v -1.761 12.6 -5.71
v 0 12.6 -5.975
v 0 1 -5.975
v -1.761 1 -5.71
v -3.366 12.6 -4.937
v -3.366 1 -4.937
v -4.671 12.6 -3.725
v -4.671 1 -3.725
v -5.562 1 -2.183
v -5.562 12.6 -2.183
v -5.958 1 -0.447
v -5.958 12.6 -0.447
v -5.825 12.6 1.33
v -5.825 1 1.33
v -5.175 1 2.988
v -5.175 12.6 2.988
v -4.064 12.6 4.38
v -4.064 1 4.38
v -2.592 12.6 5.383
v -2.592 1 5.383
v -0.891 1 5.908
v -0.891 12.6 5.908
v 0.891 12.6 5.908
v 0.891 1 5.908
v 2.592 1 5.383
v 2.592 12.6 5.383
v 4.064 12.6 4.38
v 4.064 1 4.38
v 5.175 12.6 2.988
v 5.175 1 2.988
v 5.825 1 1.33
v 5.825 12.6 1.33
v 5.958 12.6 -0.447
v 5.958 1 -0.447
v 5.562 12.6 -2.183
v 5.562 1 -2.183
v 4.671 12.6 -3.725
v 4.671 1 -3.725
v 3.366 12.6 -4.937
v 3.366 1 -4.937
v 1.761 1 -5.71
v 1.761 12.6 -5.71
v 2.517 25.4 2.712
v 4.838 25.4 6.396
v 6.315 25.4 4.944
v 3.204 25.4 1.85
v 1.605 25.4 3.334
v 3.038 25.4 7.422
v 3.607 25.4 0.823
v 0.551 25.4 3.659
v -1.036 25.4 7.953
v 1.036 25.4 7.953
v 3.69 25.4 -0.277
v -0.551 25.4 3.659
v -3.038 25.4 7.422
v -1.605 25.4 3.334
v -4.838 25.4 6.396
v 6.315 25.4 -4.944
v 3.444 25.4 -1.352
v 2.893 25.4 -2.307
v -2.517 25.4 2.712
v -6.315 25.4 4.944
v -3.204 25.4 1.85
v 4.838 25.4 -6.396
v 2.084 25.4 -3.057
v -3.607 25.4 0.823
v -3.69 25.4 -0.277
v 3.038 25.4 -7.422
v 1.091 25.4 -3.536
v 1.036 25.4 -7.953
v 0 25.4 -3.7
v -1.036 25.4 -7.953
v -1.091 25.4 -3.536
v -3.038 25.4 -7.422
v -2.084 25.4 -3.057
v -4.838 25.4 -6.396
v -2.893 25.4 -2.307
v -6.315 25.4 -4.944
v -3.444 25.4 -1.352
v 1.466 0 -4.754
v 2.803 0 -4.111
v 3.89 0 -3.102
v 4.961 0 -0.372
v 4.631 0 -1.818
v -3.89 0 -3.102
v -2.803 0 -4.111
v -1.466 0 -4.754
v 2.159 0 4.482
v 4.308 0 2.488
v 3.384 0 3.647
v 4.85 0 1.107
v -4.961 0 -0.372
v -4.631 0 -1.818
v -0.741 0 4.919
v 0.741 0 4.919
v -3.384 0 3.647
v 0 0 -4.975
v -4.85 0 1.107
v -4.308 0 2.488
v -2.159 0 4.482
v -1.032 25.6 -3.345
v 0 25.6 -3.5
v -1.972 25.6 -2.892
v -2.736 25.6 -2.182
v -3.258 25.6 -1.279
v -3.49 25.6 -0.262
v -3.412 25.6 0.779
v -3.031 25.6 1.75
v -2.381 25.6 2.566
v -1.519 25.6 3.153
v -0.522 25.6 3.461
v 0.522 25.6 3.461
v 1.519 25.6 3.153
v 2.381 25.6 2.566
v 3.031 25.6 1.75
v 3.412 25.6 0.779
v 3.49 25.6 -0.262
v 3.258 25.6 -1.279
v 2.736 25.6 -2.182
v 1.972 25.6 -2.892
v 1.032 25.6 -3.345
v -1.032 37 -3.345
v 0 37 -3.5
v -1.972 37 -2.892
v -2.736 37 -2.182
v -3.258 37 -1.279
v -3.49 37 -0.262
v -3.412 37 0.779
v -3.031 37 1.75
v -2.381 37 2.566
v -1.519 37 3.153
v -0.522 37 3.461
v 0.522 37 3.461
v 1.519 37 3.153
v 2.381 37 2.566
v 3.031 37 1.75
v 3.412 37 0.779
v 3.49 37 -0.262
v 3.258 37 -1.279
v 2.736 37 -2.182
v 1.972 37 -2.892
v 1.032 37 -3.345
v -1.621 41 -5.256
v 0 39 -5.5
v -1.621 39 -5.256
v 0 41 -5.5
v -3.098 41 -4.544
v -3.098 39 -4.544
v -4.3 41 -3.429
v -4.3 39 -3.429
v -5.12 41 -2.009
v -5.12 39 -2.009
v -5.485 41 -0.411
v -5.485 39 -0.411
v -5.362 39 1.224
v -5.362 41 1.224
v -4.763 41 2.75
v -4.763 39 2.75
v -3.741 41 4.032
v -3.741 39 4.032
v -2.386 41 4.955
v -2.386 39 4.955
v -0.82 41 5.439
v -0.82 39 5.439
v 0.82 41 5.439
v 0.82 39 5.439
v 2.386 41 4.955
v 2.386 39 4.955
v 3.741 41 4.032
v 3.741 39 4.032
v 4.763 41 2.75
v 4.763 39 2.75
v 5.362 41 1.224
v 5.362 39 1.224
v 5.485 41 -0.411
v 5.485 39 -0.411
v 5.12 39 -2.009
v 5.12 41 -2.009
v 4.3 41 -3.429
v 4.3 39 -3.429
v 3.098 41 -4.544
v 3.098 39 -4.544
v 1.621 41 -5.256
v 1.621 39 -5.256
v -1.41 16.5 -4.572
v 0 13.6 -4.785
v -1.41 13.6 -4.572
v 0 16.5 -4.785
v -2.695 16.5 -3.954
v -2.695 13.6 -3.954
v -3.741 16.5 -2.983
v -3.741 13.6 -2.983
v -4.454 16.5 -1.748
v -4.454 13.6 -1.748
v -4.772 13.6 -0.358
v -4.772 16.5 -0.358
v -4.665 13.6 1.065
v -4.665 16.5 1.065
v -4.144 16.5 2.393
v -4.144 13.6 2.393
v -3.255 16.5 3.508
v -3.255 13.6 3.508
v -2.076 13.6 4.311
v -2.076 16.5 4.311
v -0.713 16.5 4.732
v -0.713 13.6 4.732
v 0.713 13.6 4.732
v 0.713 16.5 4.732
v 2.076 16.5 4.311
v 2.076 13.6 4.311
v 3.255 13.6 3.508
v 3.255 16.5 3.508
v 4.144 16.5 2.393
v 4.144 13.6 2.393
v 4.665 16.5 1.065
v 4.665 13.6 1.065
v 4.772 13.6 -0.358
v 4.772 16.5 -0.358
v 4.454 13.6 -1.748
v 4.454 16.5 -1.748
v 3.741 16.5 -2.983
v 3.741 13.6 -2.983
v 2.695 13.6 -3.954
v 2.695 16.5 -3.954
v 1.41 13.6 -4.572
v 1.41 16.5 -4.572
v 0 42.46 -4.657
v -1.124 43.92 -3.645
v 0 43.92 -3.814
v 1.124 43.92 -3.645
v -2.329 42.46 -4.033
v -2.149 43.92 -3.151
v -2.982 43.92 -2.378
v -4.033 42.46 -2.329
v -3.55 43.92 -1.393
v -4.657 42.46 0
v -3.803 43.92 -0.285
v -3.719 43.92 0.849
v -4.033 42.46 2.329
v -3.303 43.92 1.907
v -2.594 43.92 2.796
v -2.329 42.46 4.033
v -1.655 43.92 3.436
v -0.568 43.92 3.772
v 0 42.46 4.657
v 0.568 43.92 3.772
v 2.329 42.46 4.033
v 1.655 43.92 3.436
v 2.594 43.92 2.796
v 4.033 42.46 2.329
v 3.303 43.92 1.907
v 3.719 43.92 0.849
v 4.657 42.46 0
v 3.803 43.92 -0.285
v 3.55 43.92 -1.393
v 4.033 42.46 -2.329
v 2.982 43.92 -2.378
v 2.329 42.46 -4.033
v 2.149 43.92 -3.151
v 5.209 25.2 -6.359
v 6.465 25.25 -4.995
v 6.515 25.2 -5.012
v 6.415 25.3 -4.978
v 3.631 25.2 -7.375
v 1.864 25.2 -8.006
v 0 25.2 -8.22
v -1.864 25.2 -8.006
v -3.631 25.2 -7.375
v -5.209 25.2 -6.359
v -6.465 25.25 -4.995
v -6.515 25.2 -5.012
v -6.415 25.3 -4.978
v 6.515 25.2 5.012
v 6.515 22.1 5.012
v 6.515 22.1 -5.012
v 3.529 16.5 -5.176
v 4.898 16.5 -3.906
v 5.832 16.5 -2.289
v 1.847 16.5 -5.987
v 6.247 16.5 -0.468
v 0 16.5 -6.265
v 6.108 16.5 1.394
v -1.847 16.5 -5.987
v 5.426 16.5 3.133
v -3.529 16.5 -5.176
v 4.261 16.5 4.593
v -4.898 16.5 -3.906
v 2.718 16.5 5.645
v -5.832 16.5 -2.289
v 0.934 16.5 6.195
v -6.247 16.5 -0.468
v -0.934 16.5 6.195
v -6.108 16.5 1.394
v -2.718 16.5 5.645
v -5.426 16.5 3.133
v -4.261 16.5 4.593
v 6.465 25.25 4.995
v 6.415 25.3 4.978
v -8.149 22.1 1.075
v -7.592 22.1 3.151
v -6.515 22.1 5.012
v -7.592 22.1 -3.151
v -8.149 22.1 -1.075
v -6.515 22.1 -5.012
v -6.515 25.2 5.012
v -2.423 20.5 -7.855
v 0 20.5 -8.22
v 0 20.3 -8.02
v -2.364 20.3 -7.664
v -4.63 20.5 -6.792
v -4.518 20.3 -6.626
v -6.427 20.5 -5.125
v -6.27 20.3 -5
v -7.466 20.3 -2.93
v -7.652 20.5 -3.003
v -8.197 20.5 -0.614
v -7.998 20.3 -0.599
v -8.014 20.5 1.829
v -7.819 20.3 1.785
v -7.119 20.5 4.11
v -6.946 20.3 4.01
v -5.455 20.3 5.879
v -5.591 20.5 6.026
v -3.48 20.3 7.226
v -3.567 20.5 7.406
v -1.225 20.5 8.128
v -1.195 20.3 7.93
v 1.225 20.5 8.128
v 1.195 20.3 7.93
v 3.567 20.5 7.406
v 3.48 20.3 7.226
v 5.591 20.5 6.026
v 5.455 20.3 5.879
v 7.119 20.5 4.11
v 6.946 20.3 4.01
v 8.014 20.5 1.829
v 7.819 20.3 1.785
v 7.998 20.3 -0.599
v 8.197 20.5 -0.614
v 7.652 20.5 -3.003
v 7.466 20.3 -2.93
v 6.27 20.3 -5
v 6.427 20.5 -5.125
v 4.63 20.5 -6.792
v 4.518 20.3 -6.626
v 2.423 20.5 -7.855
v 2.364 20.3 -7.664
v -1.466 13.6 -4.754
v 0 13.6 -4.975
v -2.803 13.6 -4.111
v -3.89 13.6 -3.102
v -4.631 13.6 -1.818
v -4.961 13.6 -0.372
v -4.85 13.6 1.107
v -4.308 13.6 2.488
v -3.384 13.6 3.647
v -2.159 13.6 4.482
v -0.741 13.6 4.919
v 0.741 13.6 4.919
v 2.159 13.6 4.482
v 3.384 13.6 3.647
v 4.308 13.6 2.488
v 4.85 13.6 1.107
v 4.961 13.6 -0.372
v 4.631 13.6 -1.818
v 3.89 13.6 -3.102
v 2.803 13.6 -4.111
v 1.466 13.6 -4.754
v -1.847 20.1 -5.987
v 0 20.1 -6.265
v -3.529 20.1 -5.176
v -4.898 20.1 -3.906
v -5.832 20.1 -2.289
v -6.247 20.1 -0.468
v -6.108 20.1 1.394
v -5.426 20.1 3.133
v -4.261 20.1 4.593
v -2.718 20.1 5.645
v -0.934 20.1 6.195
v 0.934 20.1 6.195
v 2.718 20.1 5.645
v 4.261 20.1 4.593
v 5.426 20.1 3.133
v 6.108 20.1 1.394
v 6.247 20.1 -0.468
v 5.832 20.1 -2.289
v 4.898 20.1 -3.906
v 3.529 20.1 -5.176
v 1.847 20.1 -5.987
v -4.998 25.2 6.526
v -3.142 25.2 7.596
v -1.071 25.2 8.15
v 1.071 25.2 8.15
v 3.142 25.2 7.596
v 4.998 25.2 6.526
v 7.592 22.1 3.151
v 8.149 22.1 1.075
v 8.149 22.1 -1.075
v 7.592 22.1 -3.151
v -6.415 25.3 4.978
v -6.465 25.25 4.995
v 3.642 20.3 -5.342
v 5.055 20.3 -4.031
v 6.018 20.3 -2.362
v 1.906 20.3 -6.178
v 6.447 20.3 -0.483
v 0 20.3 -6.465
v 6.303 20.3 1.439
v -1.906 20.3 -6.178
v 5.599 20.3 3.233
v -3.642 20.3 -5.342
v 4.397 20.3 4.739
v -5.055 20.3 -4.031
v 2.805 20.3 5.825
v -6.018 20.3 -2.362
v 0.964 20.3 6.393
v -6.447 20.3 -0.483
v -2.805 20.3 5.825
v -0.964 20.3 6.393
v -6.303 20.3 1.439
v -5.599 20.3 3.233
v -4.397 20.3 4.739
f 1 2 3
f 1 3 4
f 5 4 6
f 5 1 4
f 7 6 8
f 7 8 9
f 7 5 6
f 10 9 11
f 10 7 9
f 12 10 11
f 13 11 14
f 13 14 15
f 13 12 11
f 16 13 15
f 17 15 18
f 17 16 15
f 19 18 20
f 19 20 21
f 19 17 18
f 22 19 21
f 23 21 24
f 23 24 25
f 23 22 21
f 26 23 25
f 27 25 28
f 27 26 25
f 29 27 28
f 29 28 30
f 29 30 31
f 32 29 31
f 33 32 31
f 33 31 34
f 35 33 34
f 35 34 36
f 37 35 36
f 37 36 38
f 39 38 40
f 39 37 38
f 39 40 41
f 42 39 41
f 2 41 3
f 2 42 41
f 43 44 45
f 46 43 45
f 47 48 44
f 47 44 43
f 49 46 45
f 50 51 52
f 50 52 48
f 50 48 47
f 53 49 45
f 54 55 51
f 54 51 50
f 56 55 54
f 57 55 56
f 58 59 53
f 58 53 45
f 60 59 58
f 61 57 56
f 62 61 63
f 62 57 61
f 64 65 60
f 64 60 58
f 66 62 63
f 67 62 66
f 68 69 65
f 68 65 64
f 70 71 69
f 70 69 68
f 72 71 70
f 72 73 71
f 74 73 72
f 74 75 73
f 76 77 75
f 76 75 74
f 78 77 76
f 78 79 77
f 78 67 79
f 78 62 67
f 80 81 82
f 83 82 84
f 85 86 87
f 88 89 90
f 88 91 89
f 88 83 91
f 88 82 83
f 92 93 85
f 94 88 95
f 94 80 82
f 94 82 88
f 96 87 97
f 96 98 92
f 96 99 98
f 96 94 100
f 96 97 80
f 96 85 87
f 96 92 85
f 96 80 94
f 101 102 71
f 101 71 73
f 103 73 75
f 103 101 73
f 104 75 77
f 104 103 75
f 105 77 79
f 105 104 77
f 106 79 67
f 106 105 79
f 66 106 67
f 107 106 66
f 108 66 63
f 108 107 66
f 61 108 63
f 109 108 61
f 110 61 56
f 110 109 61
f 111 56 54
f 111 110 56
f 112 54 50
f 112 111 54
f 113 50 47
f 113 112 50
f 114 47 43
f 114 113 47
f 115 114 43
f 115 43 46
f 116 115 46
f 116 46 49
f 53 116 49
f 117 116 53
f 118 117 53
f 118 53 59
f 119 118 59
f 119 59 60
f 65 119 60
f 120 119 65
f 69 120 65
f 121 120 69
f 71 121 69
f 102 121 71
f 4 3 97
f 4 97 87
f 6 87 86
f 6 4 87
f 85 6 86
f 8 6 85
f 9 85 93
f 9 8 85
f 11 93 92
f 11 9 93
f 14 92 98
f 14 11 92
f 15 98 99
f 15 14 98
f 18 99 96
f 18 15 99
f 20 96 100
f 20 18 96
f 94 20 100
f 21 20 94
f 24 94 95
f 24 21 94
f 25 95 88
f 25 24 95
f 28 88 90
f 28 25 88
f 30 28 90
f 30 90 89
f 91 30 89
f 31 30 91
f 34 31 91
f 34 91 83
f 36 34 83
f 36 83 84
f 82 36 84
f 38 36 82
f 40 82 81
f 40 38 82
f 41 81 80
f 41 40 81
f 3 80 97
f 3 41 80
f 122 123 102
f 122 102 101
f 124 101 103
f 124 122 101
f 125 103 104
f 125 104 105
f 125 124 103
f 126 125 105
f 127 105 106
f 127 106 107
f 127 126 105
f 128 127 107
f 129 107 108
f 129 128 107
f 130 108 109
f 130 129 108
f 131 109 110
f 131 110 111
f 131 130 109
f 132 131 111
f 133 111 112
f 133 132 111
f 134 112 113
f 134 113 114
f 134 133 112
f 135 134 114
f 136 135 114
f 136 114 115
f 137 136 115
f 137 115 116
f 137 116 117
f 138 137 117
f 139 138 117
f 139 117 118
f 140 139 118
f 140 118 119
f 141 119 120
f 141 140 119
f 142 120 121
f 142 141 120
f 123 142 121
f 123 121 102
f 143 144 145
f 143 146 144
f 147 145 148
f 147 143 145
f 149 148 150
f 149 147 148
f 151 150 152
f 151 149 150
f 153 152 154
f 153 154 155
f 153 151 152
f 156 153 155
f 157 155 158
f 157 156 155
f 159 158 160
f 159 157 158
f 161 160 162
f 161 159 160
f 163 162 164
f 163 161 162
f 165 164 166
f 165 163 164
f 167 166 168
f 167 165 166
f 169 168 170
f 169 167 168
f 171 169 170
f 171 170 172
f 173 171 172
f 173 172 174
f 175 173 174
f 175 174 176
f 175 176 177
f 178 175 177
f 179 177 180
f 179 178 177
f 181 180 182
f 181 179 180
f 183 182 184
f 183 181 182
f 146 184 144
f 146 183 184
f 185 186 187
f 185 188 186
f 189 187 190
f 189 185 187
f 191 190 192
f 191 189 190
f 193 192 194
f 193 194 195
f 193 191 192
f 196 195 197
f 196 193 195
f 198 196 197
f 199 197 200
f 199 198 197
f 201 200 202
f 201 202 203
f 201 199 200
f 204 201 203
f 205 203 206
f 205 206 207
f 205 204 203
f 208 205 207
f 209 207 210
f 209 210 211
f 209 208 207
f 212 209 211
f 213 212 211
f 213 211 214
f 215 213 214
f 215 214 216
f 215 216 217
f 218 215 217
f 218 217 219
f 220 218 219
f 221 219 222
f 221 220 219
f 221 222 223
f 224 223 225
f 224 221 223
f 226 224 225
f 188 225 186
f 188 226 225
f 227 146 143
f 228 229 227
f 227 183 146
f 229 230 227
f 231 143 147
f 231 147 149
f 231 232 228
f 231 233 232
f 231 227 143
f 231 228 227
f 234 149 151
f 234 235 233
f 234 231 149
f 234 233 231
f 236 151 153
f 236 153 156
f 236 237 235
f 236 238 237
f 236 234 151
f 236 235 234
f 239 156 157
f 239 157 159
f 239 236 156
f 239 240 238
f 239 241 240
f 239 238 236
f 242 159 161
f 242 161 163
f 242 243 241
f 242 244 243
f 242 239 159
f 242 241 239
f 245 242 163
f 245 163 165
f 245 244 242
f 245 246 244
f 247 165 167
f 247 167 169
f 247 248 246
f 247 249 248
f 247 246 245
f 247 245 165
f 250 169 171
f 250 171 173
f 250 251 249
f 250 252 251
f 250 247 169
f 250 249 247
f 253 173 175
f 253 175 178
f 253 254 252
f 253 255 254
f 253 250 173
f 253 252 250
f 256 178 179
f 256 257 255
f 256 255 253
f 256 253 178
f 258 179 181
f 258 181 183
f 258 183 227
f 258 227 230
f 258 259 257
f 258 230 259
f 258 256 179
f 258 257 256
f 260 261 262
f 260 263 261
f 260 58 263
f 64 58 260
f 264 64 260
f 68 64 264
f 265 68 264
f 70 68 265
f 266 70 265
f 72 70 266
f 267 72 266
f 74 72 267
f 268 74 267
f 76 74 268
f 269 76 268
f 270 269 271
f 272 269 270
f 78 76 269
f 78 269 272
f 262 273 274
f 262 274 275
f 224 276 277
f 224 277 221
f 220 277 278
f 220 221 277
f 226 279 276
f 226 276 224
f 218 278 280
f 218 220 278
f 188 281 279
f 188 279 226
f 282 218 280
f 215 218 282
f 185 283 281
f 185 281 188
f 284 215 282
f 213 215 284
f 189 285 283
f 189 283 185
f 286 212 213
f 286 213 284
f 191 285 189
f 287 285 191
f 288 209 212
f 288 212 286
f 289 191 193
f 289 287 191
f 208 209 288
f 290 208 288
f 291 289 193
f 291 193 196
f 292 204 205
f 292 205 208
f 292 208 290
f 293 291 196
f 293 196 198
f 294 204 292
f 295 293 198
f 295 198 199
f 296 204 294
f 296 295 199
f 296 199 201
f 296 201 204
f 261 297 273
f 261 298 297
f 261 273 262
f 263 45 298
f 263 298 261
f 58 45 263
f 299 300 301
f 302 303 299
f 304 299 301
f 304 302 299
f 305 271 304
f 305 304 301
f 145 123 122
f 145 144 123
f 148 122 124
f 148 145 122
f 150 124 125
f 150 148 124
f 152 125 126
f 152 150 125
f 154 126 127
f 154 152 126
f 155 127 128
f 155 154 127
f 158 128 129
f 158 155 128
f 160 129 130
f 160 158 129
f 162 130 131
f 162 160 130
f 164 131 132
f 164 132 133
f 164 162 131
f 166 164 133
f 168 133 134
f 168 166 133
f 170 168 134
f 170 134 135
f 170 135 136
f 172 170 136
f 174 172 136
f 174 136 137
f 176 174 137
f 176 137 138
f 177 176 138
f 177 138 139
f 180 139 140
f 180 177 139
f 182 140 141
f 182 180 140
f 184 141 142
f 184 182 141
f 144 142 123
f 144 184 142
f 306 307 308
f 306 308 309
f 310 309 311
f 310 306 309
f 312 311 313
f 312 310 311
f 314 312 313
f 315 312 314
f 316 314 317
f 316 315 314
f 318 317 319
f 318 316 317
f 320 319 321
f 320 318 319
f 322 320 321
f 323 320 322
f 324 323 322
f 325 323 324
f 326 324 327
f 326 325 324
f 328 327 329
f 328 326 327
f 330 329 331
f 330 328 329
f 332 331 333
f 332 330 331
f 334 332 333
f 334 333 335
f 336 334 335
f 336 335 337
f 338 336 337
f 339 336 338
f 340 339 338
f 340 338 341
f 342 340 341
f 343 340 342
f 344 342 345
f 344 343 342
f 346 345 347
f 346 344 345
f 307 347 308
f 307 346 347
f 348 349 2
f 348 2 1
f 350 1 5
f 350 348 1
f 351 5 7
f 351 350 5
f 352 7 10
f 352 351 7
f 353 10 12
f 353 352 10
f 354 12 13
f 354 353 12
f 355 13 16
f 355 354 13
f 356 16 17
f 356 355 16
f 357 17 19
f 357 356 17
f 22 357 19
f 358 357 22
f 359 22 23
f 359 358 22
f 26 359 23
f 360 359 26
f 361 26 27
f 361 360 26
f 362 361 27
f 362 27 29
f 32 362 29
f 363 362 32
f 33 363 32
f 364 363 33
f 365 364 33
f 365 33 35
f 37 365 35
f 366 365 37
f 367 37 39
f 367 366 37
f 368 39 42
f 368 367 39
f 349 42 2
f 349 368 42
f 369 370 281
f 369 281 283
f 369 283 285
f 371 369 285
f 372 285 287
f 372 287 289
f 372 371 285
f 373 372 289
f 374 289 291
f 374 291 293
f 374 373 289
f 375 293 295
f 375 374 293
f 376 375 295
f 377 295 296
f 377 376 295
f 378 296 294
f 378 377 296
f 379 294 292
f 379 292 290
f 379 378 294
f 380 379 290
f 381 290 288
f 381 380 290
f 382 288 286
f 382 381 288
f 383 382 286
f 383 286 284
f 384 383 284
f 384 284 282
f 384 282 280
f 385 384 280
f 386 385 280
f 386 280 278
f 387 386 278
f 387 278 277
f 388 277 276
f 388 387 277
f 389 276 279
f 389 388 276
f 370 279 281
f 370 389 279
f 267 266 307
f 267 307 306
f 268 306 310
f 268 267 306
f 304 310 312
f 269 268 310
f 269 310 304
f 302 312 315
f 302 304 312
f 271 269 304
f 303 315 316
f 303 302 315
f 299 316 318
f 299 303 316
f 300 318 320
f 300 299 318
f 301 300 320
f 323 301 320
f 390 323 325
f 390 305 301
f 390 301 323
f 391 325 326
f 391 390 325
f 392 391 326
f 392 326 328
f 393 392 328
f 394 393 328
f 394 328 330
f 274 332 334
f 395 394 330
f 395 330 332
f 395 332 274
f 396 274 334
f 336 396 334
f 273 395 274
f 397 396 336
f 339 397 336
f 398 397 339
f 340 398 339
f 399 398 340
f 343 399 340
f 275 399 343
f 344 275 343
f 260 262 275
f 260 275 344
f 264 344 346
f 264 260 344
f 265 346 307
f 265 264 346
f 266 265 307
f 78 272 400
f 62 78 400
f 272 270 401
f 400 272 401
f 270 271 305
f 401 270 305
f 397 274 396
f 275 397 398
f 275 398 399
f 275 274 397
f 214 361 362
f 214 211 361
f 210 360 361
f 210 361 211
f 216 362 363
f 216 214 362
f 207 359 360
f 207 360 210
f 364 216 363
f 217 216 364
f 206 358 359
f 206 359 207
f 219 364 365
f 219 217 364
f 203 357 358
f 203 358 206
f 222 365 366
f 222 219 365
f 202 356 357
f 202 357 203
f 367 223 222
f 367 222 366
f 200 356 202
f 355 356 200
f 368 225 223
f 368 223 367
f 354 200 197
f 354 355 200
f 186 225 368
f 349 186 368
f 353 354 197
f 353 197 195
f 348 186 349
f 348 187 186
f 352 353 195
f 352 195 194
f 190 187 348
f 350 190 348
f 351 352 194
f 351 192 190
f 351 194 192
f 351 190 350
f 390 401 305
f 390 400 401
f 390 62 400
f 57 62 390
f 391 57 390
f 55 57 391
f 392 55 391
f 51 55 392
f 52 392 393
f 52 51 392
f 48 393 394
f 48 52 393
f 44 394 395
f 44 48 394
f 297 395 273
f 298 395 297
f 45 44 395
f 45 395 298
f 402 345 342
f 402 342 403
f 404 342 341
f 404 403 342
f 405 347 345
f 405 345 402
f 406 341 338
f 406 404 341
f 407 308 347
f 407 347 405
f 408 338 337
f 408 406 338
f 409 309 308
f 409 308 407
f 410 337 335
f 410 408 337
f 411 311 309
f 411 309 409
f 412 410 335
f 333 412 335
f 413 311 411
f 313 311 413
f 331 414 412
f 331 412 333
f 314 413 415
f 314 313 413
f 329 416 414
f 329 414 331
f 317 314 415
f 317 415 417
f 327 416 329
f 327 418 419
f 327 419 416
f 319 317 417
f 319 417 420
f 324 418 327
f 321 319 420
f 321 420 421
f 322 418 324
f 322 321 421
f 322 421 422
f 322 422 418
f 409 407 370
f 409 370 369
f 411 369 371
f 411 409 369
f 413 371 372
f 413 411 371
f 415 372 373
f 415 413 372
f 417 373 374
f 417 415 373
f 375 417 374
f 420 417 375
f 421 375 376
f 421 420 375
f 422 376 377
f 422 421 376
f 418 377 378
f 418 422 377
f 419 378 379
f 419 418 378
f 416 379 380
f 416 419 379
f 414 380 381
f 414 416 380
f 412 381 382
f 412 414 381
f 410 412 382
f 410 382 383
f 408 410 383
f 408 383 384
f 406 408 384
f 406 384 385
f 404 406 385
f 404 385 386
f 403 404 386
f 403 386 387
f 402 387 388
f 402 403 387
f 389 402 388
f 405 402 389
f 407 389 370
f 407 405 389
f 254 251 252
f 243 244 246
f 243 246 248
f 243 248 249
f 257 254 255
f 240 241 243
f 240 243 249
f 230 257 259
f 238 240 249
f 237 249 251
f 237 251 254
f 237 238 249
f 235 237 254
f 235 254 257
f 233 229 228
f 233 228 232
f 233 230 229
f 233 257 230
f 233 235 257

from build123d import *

# Parameters (mm, degrees)
CHAMFER1_SIZE      = 1
SKETCH2_OUTSIDE_W  = 28.378
SKETCH2_OUTSIDE_H  = 28.378
CUT_EXTRUDE1_DEPTH = 3.3
CHAMFER2_SIZE      = 0.2


with BuildPart() as part:
    # Sketch1 → Revolve1 (revolve)
    with BuildSketch(Plane.XY, mode=Mode.PRIVATE) as revolve1_sk:
        Polygon((0, 0), (5.975, 0), (5.975, 13.6), (4.785, 13.6), (4.785, 16.5), (6.265, 16.5), (6.265, 20.3), (8.22, 20.3), (8.22, 25.4), (3.5, 25.4), (3.5, 37), (5.5, 39), (5.5, 41), (3.814137214, 43.92), (0, 43.92), align=None)
    revolve(revolve1_sk.sketch.rotate(Axis((0, 0, 0), (0, 1, 0)), 90), axis=Axis((0, 0, 0), (0, 1, 0)))

    # Chamfer1
    chamfer1_edges = [part.edges().sort_by_distance(p)[0] for p in [
        (0, 13.6, 5.975),
        (0, 0, 5.975),
    ]]
    chamfer(chamfer1_edges, length=CHAMFER1_SIZE)

    # Sketch2 outside → Cut-Extrude1 (cut)
    with BuildSketch(Plane(origin=(0, 25.4, 0), x_dir=(1, 0, 0), z_dir=(0, 1, 0))):
        Rectangle(SKETCH2_OUTSIDE_W, SKETCH2_OUTSIDE_H)
        with BuildLine():
            Line((6.515, -5.012302365), (6.515, 5.012302365))
            ThreePointArc((6.515, 5.012302365), (0, 8.22), (-6.515, 5.012302365))
            Line((-6.515, 5.012302365), (-6.515, -5.012302365))
            ThreePointArc((-6.515, -5.012302365), (0, -8.22), (6.515, -5.012302365))
        make_face(mode=Mode.SUBTRACT)
    extrude(amount=-CUT_EXTRUDE1_DEPTH, mode=Mode.SUBTRACT)

    # Chamfer2
    chamfer2_edges = [part.edges().sort_by_distance(p)[0] for p in [
        (0, 25.4, 3.5),
        (0, 20.3, 8.22),
        (0, 20.3, 6.265),
        (0, 25.4, 8.22),
        (-3.630927881, 25.4, -7.374602547),
        (6.515, 25.4, 0),
        (-6.515, 25.4, 0),
    ]]
    chamfer(chamfer2_edges, length=CHAMFER2_SIZE)


solid = part.part
